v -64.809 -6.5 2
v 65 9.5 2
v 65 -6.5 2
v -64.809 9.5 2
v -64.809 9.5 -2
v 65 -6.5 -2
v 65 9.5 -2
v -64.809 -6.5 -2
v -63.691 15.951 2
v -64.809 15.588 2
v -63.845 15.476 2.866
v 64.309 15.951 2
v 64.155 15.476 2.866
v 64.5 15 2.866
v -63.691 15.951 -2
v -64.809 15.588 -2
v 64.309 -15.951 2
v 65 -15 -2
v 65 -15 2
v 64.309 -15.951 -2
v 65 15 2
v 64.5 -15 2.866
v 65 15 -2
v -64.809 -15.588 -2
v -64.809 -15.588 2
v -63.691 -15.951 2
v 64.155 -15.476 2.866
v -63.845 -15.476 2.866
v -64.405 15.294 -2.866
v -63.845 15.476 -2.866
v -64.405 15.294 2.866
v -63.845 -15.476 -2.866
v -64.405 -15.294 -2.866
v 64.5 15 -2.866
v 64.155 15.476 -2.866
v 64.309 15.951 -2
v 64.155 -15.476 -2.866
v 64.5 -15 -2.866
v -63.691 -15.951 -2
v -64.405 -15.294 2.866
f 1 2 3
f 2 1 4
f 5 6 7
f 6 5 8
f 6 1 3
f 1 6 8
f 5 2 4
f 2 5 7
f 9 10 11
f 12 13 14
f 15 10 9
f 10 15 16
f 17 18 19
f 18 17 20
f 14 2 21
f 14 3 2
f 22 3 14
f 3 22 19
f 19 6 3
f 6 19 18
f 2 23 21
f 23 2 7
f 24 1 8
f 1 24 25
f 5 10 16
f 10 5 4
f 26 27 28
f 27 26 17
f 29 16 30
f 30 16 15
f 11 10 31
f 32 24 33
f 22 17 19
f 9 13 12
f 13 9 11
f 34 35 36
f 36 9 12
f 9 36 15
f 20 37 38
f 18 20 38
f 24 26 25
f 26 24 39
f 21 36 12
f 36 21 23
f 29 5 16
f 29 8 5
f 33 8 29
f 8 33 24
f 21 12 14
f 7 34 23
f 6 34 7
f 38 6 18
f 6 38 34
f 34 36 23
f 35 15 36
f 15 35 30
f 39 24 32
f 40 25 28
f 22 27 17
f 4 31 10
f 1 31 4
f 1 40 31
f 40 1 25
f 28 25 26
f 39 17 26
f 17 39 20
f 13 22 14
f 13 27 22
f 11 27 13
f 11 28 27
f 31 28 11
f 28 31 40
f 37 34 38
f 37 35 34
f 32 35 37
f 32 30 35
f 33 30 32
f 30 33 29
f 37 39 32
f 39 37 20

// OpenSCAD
$holderDepth = 30;
$holderHeight = 10;

$cavityWidth = 120;
$cavityDepth = 13;
$cavityHeight = 4;

$rows = 4;
$spacingBetweenCavitys = 5;

difference() {
    minkowski() {
        cube([$cavityWidth + 8, $holderDepth, $cavityHeight], center = true);
        sphere(r=1); // rounding radius
    }
    
    $spacing = ($holderDepth - $cavityDepth*$rows)/2;
    echo($spacing);
    
    $totalCavitys = $holderDepth / ($cavityDepth + $spacingBetweenCavitys);
    echo($totalCavitys);
    echo($cavityDepth);
    $starting = -$holderDepth/2;
    for(i = [0:$rows-1]){
        $myPosition = i;
        translate([0,$myPosition,0])
        #cube([$cavityWidth*1.1, $cavityDepth, $cavityHeight], center = true);
    }
}
